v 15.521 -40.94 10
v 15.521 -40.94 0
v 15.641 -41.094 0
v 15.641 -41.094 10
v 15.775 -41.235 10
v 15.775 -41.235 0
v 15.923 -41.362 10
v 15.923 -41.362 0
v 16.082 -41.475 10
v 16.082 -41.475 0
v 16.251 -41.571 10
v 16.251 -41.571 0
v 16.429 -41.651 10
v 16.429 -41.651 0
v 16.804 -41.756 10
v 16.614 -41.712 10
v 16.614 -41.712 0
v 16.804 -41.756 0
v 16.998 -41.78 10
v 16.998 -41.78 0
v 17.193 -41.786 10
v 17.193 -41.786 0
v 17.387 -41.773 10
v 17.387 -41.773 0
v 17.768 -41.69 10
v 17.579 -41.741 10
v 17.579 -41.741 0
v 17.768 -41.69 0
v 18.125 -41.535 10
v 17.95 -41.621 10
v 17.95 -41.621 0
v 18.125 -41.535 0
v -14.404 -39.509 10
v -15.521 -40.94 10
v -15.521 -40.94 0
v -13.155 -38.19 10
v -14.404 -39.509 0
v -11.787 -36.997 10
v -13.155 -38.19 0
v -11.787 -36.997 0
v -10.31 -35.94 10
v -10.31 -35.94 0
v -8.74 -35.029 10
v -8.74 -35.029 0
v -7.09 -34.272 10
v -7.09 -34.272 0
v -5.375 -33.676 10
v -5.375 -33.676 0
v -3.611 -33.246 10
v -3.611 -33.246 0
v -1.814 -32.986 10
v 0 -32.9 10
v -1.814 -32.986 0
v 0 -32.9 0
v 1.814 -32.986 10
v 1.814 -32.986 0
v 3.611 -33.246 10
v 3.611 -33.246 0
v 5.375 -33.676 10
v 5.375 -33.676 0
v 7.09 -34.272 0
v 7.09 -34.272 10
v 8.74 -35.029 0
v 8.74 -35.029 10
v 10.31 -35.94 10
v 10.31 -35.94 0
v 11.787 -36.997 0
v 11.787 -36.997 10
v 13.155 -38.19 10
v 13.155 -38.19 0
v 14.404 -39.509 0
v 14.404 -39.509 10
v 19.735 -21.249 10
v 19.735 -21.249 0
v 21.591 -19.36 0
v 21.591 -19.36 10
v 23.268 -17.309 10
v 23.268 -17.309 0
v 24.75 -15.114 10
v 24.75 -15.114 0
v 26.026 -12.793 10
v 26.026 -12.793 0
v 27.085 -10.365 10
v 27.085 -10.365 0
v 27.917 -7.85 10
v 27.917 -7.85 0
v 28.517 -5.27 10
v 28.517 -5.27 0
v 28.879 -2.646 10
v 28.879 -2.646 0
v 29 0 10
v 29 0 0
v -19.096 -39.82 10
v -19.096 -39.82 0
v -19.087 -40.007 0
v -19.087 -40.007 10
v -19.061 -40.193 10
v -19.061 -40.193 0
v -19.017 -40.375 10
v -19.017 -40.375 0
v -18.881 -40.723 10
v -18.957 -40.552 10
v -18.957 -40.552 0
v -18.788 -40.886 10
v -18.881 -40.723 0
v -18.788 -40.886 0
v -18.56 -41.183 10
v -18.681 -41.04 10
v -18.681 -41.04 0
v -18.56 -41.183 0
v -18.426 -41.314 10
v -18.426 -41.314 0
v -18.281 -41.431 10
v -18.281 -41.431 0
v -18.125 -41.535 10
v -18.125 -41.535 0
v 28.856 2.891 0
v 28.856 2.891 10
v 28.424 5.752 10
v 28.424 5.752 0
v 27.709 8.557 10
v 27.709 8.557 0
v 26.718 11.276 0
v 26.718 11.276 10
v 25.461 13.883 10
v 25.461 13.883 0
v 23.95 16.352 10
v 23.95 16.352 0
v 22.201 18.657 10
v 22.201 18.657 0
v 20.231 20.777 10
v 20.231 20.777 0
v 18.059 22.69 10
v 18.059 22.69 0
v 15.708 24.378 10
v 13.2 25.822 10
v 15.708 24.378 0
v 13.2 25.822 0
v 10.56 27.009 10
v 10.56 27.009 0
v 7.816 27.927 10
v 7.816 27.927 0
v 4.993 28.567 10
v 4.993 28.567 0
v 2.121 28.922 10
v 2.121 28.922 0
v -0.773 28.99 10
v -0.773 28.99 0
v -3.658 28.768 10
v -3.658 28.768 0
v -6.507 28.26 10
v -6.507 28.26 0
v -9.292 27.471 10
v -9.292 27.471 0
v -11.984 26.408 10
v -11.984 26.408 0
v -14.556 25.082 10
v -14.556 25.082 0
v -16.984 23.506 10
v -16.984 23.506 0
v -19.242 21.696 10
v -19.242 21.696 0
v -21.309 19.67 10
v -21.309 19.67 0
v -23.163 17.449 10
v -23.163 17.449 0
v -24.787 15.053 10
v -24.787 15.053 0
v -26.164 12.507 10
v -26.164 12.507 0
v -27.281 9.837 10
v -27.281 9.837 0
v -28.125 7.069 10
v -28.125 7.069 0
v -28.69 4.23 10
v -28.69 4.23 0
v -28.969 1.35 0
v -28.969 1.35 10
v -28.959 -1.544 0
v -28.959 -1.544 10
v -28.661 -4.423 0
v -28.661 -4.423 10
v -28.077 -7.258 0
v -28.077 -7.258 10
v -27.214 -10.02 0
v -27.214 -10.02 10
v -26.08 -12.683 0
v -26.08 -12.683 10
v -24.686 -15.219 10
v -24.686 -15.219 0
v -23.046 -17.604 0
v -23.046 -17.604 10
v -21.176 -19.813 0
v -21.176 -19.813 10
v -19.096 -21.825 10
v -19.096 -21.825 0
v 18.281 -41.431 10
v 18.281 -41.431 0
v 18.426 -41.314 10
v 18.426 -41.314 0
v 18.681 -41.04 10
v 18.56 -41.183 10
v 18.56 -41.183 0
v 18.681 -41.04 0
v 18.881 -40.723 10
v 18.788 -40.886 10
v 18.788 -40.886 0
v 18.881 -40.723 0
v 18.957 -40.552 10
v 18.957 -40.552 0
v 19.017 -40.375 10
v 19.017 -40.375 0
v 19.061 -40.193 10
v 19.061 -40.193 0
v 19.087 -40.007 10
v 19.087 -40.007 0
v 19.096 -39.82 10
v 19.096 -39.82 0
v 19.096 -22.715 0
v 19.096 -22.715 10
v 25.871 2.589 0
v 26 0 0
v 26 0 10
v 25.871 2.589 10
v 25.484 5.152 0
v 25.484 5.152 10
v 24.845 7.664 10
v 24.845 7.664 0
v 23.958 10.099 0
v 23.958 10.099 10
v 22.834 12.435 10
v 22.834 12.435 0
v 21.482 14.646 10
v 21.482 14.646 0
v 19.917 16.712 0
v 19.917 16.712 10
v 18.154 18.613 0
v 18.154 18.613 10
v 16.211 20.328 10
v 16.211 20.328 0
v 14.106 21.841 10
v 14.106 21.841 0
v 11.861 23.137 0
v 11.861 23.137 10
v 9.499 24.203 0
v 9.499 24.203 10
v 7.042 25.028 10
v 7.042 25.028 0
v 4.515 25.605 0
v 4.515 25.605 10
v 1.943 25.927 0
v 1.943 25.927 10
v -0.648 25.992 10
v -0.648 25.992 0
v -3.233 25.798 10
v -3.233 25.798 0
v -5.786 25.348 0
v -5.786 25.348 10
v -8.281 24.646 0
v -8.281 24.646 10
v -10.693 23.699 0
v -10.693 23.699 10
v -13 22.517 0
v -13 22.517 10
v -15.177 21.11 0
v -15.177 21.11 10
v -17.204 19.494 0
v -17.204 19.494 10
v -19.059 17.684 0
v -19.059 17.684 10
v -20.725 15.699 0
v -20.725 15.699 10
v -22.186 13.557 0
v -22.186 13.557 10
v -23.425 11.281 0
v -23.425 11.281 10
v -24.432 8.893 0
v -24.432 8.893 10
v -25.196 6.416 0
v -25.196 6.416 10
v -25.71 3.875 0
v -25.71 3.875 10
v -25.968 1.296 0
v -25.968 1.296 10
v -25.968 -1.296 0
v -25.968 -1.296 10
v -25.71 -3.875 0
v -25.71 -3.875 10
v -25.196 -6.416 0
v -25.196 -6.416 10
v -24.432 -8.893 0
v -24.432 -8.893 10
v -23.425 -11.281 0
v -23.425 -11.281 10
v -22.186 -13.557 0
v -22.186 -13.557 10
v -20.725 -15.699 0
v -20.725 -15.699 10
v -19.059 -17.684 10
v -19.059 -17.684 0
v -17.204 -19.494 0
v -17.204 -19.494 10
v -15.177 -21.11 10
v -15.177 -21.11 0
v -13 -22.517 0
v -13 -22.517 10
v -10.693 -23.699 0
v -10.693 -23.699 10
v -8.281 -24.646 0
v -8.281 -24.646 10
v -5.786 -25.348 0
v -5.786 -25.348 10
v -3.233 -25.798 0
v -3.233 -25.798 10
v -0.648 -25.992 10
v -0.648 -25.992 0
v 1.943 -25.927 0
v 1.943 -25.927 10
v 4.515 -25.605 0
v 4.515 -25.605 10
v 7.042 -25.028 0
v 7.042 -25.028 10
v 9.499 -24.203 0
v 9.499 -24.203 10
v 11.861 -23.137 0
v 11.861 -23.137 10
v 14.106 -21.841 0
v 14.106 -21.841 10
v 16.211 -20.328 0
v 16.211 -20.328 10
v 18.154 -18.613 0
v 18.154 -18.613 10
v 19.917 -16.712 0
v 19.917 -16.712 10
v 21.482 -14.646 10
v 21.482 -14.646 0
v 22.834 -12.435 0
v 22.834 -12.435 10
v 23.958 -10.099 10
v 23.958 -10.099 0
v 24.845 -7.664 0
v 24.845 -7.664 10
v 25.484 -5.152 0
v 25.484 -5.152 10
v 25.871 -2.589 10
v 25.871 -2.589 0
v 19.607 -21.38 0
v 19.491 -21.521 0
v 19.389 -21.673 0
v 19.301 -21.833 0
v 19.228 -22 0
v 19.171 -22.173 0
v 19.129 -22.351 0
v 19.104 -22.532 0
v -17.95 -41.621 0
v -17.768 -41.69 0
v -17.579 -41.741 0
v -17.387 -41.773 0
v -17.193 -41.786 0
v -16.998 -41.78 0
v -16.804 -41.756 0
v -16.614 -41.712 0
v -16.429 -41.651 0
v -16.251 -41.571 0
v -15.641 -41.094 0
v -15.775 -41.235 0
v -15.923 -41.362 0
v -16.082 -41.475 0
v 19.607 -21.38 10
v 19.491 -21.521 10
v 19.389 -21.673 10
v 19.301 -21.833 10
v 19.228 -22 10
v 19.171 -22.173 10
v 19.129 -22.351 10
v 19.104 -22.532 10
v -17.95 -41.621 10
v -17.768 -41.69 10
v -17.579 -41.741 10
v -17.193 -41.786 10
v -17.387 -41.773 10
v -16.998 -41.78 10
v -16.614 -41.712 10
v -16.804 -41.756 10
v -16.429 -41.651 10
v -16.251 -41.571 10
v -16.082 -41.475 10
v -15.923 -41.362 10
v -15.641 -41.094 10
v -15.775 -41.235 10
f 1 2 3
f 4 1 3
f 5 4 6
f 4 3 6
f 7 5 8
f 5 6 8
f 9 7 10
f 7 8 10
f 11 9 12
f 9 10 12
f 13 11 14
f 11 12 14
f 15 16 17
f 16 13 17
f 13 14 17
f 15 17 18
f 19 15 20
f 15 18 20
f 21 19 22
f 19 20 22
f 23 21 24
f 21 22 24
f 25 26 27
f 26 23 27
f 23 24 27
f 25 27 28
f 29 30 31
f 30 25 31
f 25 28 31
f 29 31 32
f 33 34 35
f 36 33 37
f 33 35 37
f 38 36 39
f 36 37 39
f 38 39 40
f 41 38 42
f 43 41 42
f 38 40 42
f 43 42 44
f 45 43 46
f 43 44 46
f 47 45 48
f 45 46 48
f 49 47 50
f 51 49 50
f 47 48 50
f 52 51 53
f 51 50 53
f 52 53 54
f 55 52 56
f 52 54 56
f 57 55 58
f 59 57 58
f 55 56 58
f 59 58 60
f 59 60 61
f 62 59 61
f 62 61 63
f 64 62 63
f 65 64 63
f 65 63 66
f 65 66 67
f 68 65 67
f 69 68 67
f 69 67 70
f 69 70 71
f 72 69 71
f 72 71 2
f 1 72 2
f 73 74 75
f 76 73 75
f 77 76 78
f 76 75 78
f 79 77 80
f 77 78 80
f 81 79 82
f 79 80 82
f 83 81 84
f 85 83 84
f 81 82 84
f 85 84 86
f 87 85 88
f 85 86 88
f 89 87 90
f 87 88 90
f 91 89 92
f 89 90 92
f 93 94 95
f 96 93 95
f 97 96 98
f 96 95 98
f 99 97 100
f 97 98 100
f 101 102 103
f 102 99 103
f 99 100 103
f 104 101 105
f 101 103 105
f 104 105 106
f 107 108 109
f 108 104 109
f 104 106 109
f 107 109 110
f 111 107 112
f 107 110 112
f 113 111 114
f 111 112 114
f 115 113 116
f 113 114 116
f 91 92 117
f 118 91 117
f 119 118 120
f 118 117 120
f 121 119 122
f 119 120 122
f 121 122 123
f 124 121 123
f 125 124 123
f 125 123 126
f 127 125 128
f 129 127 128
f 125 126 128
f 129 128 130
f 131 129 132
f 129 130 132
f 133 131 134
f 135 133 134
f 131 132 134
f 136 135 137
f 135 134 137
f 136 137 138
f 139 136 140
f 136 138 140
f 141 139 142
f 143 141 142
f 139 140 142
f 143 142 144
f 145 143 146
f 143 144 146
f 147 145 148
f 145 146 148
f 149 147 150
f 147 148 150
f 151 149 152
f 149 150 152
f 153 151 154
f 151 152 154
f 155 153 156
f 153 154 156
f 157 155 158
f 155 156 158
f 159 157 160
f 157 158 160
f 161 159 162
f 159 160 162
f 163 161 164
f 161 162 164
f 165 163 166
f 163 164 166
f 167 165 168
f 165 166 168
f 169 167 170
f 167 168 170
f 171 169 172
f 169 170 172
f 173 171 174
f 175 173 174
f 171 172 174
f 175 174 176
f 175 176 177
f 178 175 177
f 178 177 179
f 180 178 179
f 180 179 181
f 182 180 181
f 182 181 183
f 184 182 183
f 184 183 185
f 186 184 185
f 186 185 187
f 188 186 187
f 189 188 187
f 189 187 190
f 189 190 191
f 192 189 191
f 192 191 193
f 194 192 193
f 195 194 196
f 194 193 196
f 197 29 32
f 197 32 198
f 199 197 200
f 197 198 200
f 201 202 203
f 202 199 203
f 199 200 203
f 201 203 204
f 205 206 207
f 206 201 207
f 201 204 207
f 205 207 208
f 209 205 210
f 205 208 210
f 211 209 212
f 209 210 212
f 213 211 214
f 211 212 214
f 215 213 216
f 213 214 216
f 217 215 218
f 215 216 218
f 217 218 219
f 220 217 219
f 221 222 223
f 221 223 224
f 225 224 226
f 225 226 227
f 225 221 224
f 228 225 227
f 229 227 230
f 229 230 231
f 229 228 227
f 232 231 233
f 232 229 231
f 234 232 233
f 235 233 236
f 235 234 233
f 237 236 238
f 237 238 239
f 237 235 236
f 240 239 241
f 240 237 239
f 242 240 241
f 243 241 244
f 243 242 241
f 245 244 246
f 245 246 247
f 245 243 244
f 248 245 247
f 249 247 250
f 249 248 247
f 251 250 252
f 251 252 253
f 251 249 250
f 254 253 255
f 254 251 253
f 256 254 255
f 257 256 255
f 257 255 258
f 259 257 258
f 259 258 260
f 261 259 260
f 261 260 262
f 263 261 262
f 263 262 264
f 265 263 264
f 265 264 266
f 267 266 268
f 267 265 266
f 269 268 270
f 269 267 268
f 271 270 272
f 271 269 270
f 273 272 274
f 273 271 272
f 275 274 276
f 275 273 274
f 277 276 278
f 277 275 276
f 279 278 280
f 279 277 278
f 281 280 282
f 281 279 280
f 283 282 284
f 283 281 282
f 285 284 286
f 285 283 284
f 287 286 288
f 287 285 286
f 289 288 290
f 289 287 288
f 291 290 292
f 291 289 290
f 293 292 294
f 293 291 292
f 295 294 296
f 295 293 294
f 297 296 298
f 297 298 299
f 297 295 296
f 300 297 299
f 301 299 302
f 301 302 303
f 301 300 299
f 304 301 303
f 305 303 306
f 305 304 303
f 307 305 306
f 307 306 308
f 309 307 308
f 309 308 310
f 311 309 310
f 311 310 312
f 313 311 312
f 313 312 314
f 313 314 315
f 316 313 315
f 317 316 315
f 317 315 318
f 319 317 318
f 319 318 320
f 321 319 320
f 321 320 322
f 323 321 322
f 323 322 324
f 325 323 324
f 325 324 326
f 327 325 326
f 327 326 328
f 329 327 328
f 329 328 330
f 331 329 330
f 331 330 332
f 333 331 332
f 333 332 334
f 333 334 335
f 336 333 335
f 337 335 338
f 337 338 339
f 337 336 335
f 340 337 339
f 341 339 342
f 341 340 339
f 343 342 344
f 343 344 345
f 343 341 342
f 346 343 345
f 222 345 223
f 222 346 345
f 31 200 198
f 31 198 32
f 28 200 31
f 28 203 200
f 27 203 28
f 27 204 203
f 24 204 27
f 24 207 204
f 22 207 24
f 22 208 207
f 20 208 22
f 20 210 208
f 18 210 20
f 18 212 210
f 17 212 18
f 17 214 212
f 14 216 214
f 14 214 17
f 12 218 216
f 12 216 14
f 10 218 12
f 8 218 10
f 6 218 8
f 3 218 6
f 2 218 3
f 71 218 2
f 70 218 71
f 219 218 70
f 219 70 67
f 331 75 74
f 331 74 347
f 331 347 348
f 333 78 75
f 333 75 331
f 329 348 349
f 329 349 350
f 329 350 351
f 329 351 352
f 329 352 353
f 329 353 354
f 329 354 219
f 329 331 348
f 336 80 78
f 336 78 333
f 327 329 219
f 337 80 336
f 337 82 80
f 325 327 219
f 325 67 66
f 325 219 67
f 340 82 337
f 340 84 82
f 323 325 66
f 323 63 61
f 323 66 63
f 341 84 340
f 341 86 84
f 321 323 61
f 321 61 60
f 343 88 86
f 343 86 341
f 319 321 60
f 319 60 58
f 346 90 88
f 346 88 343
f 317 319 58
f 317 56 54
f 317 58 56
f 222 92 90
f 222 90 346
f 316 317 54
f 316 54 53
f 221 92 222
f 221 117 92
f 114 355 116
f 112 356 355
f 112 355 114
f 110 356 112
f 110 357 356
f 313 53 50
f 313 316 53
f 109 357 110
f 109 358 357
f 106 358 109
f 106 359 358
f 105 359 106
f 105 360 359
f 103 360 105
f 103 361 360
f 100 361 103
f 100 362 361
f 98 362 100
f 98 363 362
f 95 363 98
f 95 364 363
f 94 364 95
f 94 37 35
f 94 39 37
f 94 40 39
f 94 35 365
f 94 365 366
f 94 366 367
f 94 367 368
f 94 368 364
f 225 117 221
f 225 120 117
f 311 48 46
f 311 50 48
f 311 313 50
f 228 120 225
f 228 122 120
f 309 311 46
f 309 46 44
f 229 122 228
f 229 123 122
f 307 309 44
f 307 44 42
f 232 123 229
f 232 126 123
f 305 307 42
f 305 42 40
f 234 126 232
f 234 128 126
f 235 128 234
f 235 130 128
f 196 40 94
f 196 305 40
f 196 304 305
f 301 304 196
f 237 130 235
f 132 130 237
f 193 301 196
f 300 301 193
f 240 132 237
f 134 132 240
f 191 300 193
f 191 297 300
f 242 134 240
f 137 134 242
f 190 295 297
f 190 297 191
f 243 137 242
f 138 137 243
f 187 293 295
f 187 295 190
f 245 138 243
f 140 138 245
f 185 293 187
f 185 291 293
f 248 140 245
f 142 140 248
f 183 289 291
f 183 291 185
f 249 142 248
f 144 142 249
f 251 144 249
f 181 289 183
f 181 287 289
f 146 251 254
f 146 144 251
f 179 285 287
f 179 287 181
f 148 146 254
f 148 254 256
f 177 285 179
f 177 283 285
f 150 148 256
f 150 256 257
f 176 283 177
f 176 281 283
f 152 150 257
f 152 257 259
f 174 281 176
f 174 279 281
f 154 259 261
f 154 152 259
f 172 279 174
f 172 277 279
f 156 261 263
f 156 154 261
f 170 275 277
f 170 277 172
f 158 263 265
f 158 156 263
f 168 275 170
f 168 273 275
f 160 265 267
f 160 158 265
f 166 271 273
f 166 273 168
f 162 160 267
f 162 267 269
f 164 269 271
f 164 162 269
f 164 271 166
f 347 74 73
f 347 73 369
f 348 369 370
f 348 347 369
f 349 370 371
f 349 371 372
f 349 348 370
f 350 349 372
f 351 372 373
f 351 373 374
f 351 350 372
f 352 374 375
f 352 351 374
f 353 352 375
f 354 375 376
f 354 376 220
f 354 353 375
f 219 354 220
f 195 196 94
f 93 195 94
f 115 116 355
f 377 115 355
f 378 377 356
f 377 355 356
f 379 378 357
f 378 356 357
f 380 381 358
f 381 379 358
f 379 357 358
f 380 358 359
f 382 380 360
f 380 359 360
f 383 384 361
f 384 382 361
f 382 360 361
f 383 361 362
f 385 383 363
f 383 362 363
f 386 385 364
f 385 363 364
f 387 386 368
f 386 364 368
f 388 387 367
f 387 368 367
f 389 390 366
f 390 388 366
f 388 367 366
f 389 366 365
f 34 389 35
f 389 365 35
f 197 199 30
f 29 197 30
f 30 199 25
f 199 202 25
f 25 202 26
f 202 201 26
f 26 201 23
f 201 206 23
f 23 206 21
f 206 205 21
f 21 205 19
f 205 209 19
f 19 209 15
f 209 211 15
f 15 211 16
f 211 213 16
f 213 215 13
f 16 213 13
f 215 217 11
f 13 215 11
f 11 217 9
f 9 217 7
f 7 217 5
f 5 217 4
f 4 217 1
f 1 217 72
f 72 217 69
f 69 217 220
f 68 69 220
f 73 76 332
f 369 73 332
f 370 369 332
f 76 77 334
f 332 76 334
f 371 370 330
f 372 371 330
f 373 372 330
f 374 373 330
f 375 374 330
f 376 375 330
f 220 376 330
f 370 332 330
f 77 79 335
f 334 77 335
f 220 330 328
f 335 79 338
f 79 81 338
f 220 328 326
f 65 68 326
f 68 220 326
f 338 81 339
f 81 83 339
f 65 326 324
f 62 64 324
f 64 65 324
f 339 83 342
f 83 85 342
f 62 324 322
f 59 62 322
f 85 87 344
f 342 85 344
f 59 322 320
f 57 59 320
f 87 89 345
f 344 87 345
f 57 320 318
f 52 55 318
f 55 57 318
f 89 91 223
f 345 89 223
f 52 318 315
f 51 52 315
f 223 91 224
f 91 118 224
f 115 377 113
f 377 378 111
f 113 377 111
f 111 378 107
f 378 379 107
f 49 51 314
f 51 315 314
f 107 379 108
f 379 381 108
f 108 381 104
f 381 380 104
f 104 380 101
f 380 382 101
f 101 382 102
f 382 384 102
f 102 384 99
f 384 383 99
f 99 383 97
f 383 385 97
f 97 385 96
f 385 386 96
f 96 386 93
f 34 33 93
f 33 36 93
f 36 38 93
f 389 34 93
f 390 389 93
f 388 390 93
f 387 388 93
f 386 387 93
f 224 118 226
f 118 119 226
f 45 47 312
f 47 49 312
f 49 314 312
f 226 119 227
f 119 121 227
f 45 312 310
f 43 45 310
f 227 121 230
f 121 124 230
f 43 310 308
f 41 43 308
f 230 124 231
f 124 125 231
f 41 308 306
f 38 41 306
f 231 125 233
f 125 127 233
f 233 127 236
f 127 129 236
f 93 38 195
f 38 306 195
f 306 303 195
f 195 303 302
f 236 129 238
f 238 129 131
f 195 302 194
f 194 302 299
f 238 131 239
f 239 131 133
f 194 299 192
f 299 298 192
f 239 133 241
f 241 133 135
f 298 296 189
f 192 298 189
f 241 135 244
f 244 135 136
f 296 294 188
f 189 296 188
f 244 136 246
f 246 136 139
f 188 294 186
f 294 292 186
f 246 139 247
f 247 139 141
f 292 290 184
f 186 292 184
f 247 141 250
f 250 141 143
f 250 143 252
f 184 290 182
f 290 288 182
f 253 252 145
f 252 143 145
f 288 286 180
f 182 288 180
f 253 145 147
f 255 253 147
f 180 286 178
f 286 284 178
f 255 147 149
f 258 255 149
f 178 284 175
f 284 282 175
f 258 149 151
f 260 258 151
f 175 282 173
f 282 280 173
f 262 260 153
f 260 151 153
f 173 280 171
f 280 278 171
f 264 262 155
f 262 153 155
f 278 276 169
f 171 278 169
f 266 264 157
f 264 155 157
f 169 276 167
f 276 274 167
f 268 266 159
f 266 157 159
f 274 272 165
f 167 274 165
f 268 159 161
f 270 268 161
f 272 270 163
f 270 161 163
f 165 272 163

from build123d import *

# Parameters (mm, degrees)
F0_R        = 26
F1_DEPTH    = 10
F2_T1_DEPTH = 10
F2_T3_DEPTH = 15.7735026919
F2_T5_DEPTH = 19.5643999635


# Not quite as in the source:
# - a fillet or chamfer that OpenCascade refuses, or shapes differently, is made with other operations: its cross-section is extruded or revolved along the edge and cut away or added


with BuildPart() as f1:
    # F0 (on Top) → F1 (new body)
    with BuildSketch(Plane.XY):
        with BuildLine():
            ThreePointArc((19.0958601534, -21.8254009127), (26.4081421578, -11.9837401413), (29, 0))
            ThreePointArc((29, 0), (-11.9837401413, 26.4081421578), (-19.0958601534, -21.8254009127))
            ThreePointArc((-19.0958601534, -21.8254009127), (0, -29), (19.0958601534, -21.8254009127))
        make_face()
        Circle(F0_R, mode=Mode.SUBTRACT)
        with BuildLine():
            ThreePointArc((19.0958601534, -21.8254009127), (0, -29), (-19.0958601534, -21.8254009127))
            Line((-19.0958601534, -21.8254009127), (-19.0958601534, -40.975))
            ThreePointArc((-19.0958601534, -40.975), (0, -29.8996567452), (19.0958601534, -40.975))
            Line((19.0958601534, -40.975), (19.0958601534, -21.8254009127))
        make_face()
        with BuildLine():
            ThreePointArc((19.0958601534, -40.975), (0, -29.8996567452), (-19.0958601534, -40.975))
            Line((-19.0958601534, -40.975), (-16.4977839421, -42.475))
            ThreePointArc((-16.4977839421, -42.475), (0, -32.8996021136), (16.4977839421, -42.475))
            Line((16.4977839421, -42.475), (19.0958601534, -40.975))
        make_face()
    extrude(amount=F1_DEPTH)

    # F2: fillet of radius 2 on 5 edges, made by hand

    # F2_s2 → F2_t1 (join)
    with BuildSketch(Plane.XY):
        with BuildLine():
            ThreePointArc((19.7348369177, -21.2493814458), (19.2625507863, -21.9154958064), (19.0958601534, -22.7148560283))
            Line((19.0958601534, -22.7148560283), (19.0958601534, -21.8254009127))
            ThreePointArc((19.0958601534, -21.8254009127), (19.4174846045, -21.5397607144), (19.7348369177, -21.2493814458))
        make_face()
    extrude(amount=F2_T1_DEPTH)

    # F2_s4 → F2_t3 (cut)
    with BuildSketch(Plane.XY.offset(-2.8867513459)):
        with BuildLine():
            ThreePointArc((-19.0958601534, -39.8202994616), (-18.827910961, -40.8202994616), (-18.0958601534, -41.5523502692))
            Line((-18.0958601534, -41.5523502692), (-19.0958601534, -40.975))
            Line((-19.0958601534, -40.975), (-19.0958601534, -39.8202994616))
        make_face()
        with BuildLine():
            ThreePointArc((18.0958601534, -41.5523502692), (18.827910961, -40.8202994616), (19.0958601534, -39.8202994616))
            Line((19.0958601534, -39.8202994616), (19.0958601534, -40.975))
            Line((19.0958601534, -40.975), (18.0958601534, -41.5523502692))
        make_face()
    extrude(amount=F2_T3_DEPTH, mode=Mode.SUBTRACT)

    # F2_s6 → F2_t5 (cut)
    with BuildSketch(Plane.XY.offset(-4.7821999818)):
        with BuildLine():
            ThreePointArc((-18.1543866102, -41.5185600036), (-16.7253721793, -41.7399540041), (-15.5206355044, -40.940137093))
            ThreePointArc((-15.5206355044, -40.940137093), (-16.0275933003, -41.6958649061), (-16.4977839421, -42.475))
            Line((-16.4977839421, -42.475), (-18.1543866102, -41.5185600036))
        make_face()
        with BuildLine():
            ThreePointArc((15.5206355044, -40.940137093), (16.7253721793, -41.7399540041), (18.1543866102, -41.5185600036))
            Line((18.1543866102, -41.5185600036), (16.4977839421, -42.475))
            ThreePointArc((16.4977839421, -42.475), (16.0275933003, -41.6958649061), (15.5206355044, -40.940137093))
        make_face()
    extrude(amount=F2_T5_DEPTH, mode=Mode.SUBTRACT)


solid = f1.part
